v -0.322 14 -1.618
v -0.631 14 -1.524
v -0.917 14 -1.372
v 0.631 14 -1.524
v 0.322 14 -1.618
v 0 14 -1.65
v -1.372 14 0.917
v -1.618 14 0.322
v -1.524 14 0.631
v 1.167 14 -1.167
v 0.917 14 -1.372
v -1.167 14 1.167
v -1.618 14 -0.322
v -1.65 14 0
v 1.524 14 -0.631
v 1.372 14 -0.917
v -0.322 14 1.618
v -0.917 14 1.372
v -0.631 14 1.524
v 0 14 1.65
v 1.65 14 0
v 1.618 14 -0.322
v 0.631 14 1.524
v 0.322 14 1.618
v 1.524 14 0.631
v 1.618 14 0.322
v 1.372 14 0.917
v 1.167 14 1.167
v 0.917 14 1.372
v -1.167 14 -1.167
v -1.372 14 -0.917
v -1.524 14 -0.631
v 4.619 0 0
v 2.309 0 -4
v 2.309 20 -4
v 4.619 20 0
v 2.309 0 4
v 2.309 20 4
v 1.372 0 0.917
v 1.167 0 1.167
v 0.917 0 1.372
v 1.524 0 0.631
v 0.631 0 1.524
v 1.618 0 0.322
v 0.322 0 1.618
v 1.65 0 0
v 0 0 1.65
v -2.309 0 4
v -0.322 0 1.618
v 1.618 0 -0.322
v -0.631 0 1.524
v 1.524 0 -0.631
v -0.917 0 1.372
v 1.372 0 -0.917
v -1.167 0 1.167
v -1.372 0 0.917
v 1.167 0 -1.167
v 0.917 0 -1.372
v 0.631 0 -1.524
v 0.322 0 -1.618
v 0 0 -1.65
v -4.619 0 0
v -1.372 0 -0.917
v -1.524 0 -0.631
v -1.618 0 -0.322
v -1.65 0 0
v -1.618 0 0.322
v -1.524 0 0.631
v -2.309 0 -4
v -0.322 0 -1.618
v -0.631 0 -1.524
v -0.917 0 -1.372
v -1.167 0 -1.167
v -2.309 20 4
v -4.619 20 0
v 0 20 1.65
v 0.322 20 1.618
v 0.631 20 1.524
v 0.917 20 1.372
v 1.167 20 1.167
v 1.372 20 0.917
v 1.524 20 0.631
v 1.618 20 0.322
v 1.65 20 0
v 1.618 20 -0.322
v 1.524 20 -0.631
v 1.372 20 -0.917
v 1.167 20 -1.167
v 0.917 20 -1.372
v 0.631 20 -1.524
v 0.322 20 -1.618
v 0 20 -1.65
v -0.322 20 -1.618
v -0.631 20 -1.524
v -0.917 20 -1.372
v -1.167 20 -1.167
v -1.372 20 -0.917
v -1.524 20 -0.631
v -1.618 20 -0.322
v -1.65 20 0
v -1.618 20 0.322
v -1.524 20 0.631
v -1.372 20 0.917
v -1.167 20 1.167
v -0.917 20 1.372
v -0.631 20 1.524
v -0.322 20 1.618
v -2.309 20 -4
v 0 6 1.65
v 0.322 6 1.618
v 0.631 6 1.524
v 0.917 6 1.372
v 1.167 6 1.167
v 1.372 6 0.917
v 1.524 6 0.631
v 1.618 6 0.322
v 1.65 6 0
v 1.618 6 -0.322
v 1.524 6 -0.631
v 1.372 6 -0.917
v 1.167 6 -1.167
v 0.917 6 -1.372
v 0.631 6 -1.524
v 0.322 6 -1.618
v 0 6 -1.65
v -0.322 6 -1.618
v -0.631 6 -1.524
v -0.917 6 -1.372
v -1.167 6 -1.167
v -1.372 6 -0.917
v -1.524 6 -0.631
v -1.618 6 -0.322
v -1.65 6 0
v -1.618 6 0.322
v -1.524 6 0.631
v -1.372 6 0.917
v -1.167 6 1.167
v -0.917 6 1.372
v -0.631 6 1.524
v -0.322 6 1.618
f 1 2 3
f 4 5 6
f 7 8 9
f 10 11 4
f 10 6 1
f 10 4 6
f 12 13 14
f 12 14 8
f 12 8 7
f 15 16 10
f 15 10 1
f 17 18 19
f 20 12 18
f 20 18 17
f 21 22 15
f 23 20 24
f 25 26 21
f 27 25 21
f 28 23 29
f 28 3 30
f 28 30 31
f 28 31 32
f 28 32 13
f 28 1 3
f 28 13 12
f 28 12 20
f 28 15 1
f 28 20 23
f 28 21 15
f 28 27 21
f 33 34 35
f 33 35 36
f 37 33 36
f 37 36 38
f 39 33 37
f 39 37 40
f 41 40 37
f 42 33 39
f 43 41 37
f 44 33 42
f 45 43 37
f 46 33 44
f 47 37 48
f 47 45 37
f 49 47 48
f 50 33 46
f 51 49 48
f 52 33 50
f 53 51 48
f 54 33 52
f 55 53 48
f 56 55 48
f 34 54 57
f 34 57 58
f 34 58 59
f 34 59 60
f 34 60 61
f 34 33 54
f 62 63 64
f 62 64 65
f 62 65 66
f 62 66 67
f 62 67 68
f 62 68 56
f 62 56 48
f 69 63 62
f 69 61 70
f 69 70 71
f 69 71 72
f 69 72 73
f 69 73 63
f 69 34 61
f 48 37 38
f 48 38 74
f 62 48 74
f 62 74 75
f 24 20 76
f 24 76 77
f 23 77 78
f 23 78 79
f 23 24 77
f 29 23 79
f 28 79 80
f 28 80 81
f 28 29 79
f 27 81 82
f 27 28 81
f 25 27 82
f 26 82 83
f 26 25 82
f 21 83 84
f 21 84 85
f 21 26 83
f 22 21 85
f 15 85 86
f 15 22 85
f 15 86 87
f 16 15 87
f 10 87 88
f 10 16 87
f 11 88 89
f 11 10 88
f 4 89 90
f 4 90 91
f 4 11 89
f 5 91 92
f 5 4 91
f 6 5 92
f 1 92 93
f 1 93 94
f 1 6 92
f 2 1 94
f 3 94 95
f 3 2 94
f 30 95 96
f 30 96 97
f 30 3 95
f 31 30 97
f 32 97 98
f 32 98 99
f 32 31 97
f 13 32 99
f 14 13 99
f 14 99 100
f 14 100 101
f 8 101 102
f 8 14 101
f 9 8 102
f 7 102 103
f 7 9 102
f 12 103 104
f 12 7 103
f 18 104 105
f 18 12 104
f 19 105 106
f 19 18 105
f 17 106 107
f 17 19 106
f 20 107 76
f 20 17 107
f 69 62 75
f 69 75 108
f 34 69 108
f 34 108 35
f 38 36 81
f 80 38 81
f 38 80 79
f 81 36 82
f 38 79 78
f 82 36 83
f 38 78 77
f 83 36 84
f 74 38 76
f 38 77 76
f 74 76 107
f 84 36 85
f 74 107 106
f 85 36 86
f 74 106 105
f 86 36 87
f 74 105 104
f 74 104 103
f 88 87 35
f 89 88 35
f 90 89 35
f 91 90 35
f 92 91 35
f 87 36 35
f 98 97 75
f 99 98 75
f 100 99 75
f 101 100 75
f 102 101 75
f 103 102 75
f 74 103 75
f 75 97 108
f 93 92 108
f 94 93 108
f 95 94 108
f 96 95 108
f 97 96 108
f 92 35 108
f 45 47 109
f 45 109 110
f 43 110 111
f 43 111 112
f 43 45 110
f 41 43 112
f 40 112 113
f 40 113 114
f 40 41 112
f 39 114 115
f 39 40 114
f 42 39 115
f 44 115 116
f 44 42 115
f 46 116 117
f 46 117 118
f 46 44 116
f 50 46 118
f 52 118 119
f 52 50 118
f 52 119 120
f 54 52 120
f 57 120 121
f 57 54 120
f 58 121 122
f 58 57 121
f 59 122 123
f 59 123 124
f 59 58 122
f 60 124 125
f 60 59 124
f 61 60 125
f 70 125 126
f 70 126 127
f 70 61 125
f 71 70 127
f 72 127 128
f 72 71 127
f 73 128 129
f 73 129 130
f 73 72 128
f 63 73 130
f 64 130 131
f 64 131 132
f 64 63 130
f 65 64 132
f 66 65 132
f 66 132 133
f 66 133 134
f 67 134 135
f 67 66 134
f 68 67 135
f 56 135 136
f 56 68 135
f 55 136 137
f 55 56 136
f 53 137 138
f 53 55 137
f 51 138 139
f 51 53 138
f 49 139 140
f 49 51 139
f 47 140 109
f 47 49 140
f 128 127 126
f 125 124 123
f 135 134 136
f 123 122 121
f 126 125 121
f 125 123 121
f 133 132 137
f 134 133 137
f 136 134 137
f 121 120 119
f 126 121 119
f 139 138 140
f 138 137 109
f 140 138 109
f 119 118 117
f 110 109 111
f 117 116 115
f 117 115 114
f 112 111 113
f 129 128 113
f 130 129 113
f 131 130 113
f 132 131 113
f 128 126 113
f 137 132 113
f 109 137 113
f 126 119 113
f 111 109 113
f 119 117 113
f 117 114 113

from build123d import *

# Parameters (mm, degrees)
EXTRUDE_1_DEPTH     = 20
SKETCH_2_R          = 1.65
CUT_EXTRUDE_1_DEPTH = 6
CUT_EXTRUDE_START   = -6
SKETCH_3_R          = 1.65
CUT_EXTRUDE_2_DEPTH = 6


with BuildPart() as part:
    # 草图1 → 凸台-拉伸1 (new body)
    with BuildSketch(Plane(origin=(0, 0, 0), x_dir=(1, 0, 0), z_dir=(0, 1, 0))):
        Polygon((4.618802154, 0), (2.309401077, -4), (-2.309401077, -4), (-4.618802154, 0), (-2.309401077, 4), (2.309401077, 4), align=None)
    extrude(amount=EXTRUDE_1_DEPTH)

    # 草图2 → 切除-拉伸1 (cut)
    with BuildSketch(Plane(origin=(0, 0, 0), x_dir=(1, 0, 0), z_dir=(0, 1, 0))):
        with Locations(Location((0, 0, 0), (0, 0, 270))):
            Circle(SKETCH_2_R)
    extrude(amount=CUT_EXTRUDE_1_DEPTH, mode=Mode.SUBTRACT)

    # 草图3 → 切除-拉伸2 (cut)
    with BuildSketch(Plane(origin=(0, 20, 0), x_dir=(1, 0, 0), z_dir=(0, 1, 0)).offset(CUT_EXTRUDE_START)):
        with Locations(Location((0, 0, 0), (0, 0, 270))):
            Circle(SKETCH_3_R)
    extrude(amount=CUT_EXTRUDE_2_DEPTH, mode=Mode.SUBTRACT)


solid = part.part
